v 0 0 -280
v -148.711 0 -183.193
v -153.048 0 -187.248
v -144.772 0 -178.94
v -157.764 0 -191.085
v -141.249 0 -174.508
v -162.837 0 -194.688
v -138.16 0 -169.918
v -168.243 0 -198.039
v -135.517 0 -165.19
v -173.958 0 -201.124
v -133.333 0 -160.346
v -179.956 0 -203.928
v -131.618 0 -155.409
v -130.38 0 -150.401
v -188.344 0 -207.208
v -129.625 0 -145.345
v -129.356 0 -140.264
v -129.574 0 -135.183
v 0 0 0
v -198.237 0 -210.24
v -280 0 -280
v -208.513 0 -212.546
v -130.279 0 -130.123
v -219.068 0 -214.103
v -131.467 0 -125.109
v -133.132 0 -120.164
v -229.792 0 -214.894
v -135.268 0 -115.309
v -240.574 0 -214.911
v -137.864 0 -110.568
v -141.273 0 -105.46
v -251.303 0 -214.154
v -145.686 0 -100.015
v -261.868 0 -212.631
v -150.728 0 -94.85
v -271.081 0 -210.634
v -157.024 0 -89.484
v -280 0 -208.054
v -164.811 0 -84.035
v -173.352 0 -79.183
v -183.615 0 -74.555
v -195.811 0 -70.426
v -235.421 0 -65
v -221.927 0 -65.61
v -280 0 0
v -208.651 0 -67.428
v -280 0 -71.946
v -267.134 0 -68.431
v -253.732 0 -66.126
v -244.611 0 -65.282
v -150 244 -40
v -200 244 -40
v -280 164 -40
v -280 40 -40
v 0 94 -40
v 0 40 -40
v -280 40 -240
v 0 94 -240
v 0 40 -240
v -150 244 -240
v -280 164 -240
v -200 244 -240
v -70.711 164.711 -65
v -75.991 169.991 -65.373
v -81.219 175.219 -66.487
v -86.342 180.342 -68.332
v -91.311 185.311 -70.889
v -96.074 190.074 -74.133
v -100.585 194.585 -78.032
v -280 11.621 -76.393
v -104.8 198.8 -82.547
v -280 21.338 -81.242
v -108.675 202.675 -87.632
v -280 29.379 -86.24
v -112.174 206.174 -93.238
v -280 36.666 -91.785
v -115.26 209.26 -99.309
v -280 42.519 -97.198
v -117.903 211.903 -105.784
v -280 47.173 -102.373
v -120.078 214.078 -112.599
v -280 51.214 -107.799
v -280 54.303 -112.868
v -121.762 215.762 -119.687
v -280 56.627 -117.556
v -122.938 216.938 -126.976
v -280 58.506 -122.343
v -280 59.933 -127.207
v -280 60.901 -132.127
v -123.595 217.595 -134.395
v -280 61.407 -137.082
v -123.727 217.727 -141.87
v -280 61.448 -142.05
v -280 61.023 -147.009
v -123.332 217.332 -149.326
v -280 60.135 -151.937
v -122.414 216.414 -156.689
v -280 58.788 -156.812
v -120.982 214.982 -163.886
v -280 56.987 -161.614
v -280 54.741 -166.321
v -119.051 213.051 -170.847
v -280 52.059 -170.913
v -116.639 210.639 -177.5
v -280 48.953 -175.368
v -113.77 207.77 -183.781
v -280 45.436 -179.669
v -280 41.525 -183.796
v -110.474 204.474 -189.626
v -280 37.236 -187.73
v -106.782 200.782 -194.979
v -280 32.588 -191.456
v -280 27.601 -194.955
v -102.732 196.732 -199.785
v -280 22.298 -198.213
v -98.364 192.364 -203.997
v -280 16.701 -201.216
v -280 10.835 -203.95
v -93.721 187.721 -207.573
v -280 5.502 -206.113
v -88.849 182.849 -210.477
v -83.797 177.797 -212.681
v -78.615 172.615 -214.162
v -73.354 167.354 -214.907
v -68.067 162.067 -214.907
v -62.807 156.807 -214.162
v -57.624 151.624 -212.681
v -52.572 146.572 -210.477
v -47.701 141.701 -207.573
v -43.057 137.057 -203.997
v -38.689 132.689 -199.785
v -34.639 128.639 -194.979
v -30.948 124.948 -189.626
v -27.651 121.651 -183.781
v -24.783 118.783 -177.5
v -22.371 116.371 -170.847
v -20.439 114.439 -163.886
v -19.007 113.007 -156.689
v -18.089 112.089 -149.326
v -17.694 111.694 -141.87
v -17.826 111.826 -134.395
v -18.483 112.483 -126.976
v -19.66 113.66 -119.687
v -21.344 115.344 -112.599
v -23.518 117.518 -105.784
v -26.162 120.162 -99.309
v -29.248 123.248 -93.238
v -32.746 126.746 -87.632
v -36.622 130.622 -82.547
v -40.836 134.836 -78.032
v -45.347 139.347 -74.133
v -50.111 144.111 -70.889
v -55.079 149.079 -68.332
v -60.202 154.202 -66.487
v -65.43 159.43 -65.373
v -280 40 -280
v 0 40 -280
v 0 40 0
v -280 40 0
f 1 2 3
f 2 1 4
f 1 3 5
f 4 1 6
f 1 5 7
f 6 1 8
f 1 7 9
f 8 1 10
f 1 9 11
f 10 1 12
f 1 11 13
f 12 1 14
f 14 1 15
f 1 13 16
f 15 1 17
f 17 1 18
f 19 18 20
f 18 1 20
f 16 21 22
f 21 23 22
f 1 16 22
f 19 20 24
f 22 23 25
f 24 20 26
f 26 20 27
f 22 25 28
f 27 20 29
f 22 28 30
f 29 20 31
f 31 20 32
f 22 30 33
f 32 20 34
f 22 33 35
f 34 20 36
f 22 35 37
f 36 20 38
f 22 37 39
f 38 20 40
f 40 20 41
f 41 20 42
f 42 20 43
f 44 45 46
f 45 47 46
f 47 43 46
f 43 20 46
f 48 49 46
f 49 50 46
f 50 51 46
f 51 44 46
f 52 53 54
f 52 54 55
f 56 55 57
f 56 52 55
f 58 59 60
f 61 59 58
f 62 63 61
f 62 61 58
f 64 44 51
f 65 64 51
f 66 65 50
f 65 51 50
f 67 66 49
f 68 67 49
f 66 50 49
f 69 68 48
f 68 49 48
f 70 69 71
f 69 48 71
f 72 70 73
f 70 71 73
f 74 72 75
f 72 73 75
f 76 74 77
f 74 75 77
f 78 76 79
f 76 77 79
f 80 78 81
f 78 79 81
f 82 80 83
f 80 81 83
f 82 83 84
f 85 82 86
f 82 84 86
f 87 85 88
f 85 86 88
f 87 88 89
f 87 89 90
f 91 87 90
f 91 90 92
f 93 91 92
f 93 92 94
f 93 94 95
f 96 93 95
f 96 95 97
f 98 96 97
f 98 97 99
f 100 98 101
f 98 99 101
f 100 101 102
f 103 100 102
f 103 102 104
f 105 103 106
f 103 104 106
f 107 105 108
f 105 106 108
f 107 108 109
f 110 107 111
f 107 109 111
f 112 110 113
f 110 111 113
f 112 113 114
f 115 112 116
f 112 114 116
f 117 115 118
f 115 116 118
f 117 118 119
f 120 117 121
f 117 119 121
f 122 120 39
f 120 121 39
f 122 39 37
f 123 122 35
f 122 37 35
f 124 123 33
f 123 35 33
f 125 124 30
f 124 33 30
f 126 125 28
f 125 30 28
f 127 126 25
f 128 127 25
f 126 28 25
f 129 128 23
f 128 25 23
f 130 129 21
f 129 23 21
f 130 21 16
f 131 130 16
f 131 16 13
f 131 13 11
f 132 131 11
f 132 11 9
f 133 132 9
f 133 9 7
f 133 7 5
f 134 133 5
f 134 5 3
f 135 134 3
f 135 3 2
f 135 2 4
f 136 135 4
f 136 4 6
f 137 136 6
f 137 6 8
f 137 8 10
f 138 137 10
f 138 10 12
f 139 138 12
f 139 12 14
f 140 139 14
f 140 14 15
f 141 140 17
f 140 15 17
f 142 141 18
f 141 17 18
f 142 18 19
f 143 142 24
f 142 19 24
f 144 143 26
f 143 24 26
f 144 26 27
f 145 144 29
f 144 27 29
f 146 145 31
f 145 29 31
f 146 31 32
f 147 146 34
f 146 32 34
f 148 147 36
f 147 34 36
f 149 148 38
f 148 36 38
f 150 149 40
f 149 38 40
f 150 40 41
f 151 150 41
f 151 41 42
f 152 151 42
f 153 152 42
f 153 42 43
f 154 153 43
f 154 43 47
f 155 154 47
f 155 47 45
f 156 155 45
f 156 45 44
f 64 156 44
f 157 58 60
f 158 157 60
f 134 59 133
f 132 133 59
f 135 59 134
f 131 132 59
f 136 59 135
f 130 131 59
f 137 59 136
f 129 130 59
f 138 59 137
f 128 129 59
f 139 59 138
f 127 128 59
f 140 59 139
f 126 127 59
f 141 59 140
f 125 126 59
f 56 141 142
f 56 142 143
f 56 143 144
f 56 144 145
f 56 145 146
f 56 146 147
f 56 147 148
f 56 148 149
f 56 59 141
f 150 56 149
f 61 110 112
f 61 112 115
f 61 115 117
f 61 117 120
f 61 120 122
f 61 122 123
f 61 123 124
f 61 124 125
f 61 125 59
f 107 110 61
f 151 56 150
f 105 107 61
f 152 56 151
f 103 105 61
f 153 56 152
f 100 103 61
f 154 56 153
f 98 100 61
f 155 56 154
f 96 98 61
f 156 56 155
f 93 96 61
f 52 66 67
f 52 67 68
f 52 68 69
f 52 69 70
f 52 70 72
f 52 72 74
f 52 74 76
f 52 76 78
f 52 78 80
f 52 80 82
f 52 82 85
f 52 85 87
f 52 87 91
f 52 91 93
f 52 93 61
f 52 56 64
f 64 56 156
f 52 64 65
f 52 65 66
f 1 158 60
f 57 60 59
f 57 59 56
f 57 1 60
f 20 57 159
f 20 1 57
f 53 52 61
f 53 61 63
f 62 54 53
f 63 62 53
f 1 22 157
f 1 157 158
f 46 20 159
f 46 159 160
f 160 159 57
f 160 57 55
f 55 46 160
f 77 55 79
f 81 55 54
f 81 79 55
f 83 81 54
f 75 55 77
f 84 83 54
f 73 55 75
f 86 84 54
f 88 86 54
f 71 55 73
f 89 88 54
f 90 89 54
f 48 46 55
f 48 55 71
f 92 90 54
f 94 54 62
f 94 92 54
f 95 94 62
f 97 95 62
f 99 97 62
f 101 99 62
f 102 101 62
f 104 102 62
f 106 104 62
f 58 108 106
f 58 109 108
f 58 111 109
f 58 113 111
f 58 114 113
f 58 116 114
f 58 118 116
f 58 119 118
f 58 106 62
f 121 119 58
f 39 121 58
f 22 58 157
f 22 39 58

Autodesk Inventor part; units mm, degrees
ref_plane "YZ Plane" through (0, 0, 0) normal (1, 0, 0) x (0, 1, 0)
ref_plane "XZ Plane" through (0, 0, 0) normal (0, 1, 0) x (-1, 0, 0)
ref_plane "XY Plane" through (0, 0, 0) normal (0, 0, 1) x (1, 0, 0)
sketch "Sketch1" plane through (0, 0, 0) normal (0, 1, 0) x (-1, 0, 0)
  line L0 (0, 0) -> (280, 0)
  line L1 (280, 0) -> (280, -280)
  line L2 (280, -280) -> (0, -280)
  line L3 (0, -280) -> (0, 0)
  line L4 (0, 0) -> (0, -20)
  line L5 (0, -20) -> (280, -20)
  line L6 (280, -20) -> (280, -260)
  line L7 (280, -260) -> (0, -260)
  line L8 (0, -260) -> (0, -20)
  dimension "d0" = 280
  dimension "d1" = 280
  dimension "d2" = 20
  dimension "d3" = 240
extrude "Extrusion1" add sketch "Sketch1" along normal blind 244 contours L5 L1 L7 L3
sketch "Sketch2" plane through (0, 0, 0) normal (0, -1, 0) x (1, 0, 0)
  line L0 (0, 0) -> (-280, 0)
  line L1 (-280, 0) -> (-280, -280)
  line L2 (-280, -280) -> (0, -280)
  line L3 (0, -280) -> (0, 0)
  dimension "d6" = 280
  dimension "d7" = 280
extrude "Extrusion2" add sketch "Sketch2" against normal blind 40
sketch "Sketch3" plane through (-280, 244, -20) normal (0, 0, 1) x (1, 0, 0)
  line L0 (0, -244) -> (280, -244) projected
  line L1 (0, -244) -> (0, -80)
  line L2 (0, -204) -> (0, 0) projected
  line L3 (0, 0) -> (80, 0)
  line L4 (0, 0) -> (280, 0) projected
  line L5 (80, 0) -> (130, 0)
  line L6 (280, -244) -> (280, -150)
  line L7 (280, -244) -> (280, -204) projected
  line L8 (280, -150) -> (130, 0)
  line L9 (0, -80) -> (80, 0)
  line L10 (0, 0) -> (0, -80)
  line L11 (280, 0) -> (280, -150)
  line L12 (280, 0) -> (130, 0)
  dimension "d10" = 164
  dimension "d11" = 80
  dimension "d12" = 50
  dimension "d13" = 94
extrude "Extrusion3" cut sketch "Sketch3" against normal through all contours L2 L3 L9 | L8 L4 L11
sketch "Sketch4" plane through (-150, 244, -260) normal (0.7071, 0.7071, 0) x (-0.7071, 0.7071, 0)
  line L0 (-212.132, 0) -> (-212.132, 240) projected
  line L1 (-212.132, 240) -> (0, 240) projected
  point P0 (-278.6001, 260)
  point P1 (-112.132, 120)
  dimension "d16" = 100
  dimension "d17" = 120
hole "Hole1" at (-70.7107, 164.7107, -140) direction (-0.7071, -0.7071, 0) diameter 150 end through all
sketch "Sketch5" plane through (-280, 40, -20) normal (0, 0, 1) x (1, 0, 0)
  line L0 (280, 0) -> (0, 0) projected
  line L1 (0, 0) -> (280, 0)
  line L2 (130, 204) -> (280, 54) projected
  line L3 (280, 0) -> (280, 54)
  line L4 (280, 54) -> (130, 204)
  line L5 (130, 204) -> (80, 204) projected
  line L6 (130, 204) -> (80, 204)
  line L7 (0, 0) -> (0, 124) projected
  line L8 (80, 204) -> (0, 124)
  line L9 (0, 124) -> (0, 0)
  point P0 (280, -40)
extrude "Extrusion4" cut sketch "Sketch5" against normal blind 20
sketch "Sketch6" plane through (0, 40, -260) normal (0, 0, -1) x (-1, 0, 0)
  line L0 (0, 0) -> (280, 0) projected
  line L1 (150, 204) -> (0, 54) projected
  line L2 (0, 0) -> (0, 54)
  line L3 (0, 54) -> (150, 204)
  line L4 (280, 124) -> (200, 204) projected
  line L5 (150, 204) -> (200, 204)
  line L6 (200, 204) -> (280, 124)
  line L7 (280, 124) -> (280, 0)
  line L8 (280, 0) -> (0, 0)
  point P0 (0, -40)
extrude "Extrusion5" cut sketch "Sketch6" against normal blind 20
properties part number "MMAE 232 - Assignment 1a-Nicholas Skiba" material "Aluminum 6061"
